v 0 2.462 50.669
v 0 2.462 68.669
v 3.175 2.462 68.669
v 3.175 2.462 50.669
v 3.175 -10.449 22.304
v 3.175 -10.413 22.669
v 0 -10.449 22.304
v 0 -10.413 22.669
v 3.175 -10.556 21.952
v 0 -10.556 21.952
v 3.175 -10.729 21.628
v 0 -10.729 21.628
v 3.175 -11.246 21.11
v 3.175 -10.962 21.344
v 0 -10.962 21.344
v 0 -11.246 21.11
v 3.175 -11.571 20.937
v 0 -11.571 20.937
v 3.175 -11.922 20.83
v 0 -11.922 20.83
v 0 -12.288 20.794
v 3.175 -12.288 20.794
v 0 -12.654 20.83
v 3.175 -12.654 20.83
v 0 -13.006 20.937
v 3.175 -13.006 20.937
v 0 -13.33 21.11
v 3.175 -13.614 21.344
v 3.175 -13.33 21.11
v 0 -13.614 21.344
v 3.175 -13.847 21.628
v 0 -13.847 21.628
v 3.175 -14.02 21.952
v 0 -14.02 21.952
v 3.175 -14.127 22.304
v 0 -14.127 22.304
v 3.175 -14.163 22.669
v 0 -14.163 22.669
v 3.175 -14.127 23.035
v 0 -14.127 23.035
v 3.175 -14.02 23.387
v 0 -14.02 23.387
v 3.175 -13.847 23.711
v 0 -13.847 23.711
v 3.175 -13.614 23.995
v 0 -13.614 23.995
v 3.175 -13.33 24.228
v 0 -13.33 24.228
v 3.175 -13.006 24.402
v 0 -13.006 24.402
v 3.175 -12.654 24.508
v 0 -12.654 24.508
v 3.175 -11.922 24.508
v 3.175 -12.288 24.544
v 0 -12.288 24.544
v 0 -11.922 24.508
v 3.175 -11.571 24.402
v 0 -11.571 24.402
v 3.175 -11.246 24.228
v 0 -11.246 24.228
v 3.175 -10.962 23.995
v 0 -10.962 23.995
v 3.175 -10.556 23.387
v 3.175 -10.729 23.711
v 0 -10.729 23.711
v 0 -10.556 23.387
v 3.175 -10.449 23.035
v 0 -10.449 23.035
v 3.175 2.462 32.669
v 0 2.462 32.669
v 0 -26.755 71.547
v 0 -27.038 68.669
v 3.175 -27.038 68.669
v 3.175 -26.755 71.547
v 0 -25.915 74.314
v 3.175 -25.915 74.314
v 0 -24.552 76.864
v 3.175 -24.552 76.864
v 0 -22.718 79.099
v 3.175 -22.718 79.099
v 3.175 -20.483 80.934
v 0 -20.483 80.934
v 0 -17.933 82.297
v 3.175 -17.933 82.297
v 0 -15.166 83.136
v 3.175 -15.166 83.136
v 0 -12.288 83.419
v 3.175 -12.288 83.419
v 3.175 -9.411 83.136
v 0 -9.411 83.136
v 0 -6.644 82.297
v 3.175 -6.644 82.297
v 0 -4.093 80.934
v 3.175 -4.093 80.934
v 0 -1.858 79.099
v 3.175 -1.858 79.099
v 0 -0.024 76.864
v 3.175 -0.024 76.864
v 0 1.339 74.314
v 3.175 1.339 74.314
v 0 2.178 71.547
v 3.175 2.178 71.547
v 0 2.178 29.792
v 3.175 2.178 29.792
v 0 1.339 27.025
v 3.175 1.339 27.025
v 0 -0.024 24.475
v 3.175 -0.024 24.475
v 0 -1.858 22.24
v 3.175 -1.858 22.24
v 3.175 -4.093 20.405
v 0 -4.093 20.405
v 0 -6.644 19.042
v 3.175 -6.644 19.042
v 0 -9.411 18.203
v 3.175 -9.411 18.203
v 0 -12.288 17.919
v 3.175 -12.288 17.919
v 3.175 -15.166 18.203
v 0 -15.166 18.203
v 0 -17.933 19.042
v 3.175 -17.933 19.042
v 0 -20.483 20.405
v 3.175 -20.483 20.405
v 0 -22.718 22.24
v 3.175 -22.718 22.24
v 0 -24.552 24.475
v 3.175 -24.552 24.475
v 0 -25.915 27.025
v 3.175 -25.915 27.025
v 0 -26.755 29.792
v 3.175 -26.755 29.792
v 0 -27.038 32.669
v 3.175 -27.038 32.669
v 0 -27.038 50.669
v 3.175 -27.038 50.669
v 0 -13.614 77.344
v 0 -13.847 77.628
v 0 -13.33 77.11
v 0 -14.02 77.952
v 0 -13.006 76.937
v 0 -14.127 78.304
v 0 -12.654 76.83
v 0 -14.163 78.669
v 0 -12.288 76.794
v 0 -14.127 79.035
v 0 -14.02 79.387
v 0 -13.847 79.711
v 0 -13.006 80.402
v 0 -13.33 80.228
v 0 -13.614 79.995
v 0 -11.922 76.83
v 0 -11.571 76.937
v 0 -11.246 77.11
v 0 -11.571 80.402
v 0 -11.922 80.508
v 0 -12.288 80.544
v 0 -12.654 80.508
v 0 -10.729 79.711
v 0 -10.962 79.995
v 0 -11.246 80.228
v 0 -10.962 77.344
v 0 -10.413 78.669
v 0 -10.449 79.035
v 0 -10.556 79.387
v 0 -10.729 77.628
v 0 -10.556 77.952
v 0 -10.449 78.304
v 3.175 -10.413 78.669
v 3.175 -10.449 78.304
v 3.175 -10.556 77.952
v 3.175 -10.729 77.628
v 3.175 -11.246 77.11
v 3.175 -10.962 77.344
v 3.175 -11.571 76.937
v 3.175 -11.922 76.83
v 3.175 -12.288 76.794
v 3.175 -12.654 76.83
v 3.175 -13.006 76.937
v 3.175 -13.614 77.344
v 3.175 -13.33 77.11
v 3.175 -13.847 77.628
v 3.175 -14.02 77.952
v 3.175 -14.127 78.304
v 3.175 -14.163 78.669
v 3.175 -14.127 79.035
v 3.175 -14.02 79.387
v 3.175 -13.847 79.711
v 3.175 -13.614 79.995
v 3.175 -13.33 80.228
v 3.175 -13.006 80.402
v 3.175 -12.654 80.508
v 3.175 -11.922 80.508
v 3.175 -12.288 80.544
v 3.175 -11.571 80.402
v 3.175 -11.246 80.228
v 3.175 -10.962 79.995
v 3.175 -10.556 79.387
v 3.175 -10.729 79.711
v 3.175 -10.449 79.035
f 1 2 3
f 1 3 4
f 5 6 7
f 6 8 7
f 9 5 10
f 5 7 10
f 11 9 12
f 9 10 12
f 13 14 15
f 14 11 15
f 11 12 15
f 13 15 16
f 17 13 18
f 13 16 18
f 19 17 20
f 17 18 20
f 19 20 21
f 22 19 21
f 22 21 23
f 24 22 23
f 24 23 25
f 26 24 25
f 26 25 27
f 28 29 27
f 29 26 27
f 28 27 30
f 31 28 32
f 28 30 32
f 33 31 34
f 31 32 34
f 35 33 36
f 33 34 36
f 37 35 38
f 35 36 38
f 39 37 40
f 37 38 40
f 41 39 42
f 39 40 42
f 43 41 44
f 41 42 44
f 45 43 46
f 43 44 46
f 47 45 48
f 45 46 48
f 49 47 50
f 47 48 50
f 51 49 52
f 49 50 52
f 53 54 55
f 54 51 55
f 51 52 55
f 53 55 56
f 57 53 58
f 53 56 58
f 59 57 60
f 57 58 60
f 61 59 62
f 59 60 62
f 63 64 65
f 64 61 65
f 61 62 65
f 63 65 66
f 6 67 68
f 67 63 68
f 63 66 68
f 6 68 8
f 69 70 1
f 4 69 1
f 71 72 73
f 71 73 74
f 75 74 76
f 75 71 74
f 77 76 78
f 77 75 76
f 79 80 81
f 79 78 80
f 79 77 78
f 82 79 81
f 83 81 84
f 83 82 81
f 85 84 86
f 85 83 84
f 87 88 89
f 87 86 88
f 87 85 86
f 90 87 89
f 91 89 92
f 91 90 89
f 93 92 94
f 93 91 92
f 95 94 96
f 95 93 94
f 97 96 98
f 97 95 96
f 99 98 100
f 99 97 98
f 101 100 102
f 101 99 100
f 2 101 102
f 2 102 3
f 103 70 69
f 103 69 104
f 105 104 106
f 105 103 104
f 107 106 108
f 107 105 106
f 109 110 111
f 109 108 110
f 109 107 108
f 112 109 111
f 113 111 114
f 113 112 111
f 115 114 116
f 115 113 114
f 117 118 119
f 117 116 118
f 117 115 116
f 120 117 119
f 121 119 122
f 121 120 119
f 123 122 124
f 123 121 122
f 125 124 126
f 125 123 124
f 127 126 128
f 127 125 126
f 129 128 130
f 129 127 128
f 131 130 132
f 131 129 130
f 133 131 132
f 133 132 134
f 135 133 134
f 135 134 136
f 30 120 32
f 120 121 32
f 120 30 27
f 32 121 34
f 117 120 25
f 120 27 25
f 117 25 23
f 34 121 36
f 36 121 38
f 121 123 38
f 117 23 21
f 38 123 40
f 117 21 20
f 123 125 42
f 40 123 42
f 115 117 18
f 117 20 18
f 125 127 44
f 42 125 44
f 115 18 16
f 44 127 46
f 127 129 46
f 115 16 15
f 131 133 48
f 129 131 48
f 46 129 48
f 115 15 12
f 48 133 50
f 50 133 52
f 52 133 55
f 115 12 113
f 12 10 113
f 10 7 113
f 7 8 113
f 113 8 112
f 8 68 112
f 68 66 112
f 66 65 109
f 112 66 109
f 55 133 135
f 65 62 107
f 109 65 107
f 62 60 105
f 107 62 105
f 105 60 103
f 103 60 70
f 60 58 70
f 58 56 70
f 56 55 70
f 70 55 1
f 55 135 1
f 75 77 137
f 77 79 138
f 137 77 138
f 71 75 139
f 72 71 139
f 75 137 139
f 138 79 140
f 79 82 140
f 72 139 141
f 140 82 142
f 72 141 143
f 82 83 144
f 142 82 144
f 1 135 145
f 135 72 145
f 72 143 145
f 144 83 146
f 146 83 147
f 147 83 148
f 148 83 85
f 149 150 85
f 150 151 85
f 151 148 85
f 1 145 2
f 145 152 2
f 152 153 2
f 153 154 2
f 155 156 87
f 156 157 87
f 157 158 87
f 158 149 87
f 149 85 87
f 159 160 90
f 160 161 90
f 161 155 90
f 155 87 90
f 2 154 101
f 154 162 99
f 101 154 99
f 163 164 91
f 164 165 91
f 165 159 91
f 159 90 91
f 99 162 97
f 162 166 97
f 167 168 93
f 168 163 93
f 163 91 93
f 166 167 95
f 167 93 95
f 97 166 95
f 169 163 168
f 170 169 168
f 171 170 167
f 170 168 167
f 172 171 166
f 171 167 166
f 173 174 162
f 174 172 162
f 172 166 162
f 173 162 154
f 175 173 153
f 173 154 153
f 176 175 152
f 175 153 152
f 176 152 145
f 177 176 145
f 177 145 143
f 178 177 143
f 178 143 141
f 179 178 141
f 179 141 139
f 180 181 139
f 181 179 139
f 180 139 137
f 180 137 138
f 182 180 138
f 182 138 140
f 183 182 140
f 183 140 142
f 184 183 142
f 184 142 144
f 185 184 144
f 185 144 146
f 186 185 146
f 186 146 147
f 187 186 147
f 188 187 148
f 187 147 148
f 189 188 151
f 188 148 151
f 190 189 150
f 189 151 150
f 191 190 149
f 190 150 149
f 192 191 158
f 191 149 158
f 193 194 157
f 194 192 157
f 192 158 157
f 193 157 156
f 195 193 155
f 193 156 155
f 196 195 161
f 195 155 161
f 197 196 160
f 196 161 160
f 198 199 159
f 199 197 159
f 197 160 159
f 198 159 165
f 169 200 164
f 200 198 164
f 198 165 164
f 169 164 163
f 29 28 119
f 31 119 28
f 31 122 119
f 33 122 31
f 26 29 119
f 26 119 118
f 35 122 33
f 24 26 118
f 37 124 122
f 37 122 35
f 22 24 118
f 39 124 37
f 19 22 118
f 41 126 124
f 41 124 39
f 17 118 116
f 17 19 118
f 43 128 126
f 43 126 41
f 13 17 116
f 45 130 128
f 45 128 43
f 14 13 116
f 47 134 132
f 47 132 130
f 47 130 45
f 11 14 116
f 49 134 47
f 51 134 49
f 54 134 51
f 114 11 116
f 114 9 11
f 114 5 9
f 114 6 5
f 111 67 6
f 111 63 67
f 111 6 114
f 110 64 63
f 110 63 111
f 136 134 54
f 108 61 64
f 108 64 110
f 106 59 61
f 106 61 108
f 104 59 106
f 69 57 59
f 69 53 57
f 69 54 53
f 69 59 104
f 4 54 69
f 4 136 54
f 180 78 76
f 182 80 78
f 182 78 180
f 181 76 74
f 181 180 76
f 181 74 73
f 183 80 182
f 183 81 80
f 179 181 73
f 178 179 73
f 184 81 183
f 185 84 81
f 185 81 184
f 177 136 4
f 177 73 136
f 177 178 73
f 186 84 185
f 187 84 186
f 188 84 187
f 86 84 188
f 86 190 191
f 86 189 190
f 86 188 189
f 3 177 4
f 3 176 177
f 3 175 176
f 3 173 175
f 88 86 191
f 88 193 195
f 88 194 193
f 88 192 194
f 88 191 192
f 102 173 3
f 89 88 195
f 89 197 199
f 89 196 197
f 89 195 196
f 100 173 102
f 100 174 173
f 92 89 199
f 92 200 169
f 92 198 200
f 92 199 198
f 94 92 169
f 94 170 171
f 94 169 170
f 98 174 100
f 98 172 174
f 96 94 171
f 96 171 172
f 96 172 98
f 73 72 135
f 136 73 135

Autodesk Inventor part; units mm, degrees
ref_plane "YZ Plane" through (0, 0, 0) normal (1, 0, 0) x (0, 1, 0)
ref_plane "XZ Plane" through (0, 0, 0) normal (0, 1, 0) x (-1, 0, 0)
ref_plane "XY Plane" through (0, 0, 0) normal (0, 0, 1) x (1, 0, 0)
sketch "Sketch1" plane through (0, 0, 0) normal (1, 0, 0) x (0, 1, 0)
  arc A0 (-27.0381, 32.6694) -> (2.4619, 32.6694) centre (-12.2881, 32.6694) ccw
  arc A1 (-27.0381, 32.6694) -> (2.4619, 32.6694) centre (-12.2881, 32.6694) ccw
  arc A2 (-27.0381, 32.6694) -> (2.4619, 32.6694) centre (-12.2881, 32.6694) ccw
  line L0 (-27.0381, 32.6694) -> (-27.0381, 50.6694)
  line L1 (2.4619, 32.6694) -> (2.4619, 50.6694)
  line L2 (-27.0381, 50.6694) -> (-37.7302, 50.6694)
  arc A3 (2.4619, 68.6694) -> (-27.0381, 68.6694) centre (-12.2881, 68.6694) ccw
  arc A4 (2.4619, 68.6694) -> (-27.0381, 68.6694) centre (-12.2881, 68.6694) ccw
  arc A5 (2.4619, 68.6694) -> (-27.0381, 68.6694) centre (-12.2881, 68.6694) ccw
  line L3 (-27.0381, 68.6694) -> (-27.0381, 50.6694)
  line L4 (2.4619, 68.6694) -> (2.4619, 50.6694)
  circle A6 centre (-12.2881, 22.6694) radius 1.875
  circle A7 centre (-12.2881, 78.6694) radius 1.875
  point P0 (0, 0)
  dimension "d7" = 29.5
  dimension "d8" = 29.5
  dimension "d9" = 29.5
  dimension "d12" = 18
  dimension "d13" = 18
  dimension "d14" = 3.75
  dimension "d16" = 3.75
  dimension "d17" = 56
extrude "Extrusion1" add sketch "Sketch1" along normal blind 3.175
properties part number "clamp"
